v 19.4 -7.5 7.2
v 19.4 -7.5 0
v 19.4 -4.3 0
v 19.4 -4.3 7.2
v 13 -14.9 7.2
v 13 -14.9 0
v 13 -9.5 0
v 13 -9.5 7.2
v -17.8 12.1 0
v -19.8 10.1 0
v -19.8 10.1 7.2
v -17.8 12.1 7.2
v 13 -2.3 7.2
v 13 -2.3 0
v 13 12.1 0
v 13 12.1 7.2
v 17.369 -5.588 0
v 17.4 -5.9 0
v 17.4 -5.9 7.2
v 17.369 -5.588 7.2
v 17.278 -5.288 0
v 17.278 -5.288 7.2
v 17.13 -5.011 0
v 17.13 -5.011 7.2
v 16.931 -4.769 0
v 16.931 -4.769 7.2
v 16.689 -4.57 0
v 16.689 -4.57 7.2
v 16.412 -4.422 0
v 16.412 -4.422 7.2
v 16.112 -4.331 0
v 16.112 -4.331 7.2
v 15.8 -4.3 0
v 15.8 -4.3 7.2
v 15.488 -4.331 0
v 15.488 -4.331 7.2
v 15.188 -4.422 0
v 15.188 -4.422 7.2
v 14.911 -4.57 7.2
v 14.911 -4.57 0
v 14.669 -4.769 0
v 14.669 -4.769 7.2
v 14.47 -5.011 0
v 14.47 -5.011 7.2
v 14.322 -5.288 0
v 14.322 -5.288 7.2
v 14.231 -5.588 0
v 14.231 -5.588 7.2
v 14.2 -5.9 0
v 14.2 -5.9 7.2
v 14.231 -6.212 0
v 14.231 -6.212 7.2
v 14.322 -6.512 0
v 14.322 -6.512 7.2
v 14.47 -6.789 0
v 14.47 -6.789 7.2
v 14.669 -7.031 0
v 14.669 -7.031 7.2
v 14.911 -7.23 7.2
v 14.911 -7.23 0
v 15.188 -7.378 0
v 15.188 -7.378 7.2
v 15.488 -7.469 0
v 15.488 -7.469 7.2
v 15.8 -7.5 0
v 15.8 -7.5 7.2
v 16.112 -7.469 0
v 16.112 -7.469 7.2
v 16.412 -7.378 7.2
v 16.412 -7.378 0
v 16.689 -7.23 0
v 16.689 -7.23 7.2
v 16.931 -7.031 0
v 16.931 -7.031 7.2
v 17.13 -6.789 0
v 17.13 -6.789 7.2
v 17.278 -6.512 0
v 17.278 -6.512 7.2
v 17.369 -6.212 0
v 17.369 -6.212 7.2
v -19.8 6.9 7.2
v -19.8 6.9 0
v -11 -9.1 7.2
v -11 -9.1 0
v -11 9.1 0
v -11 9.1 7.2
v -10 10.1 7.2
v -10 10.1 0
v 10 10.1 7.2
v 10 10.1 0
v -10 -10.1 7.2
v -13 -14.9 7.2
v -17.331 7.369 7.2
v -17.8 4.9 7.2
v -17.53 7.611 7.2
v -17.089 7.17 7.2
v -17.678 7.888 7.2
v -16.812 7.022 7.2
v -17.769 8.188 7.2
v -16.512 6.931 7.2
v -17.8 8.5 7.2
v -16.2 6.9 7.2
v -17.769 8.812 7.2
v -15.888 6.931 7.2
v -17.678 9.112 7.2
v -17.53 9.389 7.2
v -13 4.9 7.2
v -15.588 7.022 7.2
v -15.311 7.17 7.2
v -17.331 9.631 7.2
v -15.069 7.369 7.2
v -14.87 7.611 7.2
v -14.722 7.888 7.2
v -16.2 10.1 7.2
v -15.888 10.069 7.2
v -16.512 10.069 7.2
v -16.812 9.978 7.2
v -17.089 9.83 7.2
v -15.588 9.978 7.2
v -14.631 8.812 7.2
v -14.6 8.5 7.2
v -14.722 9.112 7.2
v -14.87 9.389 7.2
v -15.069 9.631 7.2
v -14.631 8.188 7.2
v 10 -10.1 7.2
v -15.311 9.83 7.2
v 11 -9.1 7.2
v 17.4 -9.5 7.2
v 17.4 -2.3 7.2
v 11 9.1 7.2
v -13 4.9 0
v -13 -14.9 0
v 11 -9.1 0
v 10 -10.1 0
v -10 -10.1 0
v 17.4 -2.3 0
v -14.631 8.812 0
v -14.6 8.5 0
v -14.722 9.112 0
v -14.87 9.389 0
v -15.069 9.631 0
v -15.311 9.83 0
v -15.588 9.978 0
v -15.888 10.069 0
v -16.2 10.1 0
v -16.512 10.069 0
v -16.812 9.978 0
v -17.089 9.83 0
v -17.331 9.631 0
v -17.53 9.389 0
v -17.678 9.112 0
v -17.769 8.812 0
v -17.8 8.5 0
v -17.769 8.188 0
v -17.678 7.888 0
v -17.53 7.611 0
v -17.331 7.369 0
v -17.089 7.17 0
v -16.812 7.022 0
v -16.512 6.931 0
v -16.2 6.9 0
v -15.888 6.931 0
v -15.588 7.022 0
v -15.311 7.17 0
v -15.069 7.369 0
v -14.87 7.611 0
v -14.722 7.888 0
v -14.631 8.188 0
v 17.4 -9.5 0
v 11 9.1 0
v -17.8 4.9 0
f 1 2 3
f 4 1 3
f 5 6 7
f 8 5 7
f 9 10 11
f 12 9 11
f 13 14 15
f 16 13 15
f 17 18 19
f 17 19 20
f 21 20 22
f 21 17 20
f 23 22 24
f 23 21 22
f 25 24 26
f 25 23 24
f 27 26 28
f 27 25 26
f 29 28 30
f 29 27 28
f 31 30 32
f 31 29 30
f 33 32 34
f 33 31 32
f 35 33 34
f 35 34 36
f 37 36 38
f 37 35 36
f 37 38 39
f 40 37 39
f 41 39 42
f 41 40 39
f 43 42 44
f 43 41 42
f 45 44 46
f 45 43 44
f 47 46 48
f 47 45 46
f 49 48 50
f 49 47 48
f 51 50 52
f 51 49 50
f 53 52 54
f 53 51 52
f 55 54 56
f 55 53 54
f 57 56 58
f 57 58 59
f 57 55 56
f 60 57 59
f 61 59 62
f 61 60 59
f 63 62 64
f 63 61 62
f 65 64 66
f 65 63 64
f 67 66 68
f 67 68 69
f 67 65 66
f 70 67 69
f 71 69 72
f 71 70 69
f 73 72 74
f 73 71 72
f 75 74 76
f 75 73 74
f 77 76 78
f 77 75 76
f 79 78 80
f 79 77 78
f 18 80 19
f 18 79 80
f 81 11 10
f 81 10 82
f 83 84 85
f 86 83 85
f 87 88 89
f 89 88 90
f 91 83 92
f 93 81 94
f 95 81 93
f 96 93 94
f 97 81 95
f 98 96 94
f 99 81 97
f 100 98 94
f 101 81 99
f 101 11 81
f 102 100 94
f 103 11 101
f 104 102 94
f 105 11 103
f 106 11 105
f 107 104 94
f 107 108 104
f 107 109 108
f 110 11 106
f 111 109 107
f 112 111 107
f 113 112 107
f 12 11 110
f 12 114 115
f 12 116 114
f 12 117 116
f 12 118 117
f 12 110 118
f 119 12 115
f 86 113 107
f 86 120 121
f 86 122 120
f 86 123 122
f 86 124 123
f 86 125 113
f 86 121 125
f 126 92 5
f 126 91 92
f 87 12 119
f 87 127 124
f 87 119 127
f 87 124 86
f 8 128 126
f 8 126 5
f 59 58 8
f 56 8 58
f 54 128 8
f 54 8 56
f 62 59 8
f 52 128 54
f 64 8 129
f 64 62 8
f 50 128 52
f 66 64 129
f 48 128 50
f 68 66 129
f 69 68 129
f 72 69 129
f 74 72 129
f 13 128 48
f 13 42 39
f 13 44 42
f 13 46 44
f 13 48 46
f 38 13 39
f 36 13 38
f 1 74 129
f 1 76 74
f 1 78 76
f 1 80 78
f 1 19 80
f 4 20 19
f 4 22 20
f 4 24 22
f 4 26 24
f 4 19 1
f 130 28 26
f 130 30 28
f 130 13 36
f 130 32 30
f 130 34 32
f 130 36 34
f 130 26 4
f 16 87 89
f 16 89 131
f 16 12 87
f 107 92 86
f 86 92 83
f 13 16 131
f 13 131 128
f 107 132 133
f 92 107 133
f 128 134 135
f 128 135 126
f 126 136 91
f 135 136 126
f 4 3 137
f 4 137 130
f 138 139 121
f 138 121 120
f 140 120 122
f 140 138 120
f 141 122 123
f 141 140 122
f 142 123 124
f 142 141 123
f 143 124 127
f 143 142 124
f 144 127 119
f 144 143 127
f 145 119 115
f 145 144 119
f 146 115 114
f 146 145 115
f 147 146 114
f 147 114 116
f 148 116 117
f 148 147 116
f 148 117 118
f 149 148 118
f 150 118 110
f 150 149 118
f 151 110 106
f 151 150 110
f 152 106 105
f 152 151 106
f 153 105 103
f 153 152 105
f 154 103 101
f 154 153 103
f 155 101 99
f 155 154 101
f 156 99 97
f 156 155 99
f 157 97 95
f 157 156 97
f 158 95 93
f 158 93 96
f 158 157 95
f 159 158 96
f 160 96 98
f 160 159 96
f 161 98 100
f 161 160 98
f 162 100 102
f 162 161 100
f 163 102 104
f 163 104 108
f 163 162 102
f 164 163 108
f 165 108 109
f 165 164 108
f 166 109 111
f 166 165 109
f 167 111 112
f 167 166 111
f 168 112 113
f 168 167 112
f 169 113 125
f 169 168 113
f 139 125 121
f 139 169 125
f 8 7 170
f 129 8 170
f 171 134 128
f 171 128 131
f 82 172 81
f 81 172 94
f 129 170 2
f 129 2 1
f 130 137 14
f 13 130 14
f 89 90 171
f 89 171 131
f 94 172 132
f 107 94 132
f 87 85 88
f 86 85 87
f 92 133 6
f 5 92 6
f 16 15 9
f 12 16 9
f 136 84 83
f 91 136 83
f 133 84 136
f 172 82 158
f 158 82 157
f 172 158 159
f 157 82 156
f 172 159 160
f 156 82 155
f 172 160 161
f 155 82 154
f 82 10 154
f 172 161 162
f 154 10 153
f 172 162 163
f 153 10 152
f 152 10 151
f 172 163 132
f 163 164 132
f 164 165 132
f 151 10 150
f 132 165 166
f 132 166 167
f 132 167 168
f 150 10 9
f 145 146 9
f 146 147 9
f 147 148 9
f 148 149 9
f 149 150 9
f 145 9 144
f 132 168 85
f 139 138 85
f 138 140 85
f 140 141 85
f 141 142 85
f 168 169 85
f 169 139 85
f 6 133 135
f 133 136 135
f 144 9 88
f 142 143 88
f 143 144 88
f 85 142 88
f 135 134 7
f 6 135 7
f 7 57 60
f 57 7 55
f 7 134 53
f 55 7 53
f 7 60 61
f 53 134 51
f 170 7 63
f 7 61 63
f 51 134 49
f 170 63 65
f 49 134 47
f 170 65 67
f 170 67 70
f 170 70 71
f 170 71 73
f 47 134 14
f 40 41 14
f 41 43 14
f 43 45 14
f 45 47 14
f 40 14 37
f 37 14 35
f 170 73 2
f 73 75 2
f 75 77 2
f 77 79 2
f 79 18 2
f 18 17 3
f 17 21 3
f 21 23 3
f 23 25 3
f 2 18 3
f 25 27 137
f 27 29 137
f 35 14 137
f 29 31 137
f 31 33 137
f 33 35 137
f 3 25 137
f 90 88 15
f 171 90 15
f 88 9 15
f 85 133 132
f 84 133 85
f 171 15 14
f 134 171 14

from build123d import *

# Parameters (mm, degrees)
F0_R     = 1.6
F0_W     = 22
F0_H     = 20.2
F1_DEPTH = 7.2
F2_SIZE  = 2
F3_SIZE  = 1


with BuildPart() as f1:
    # F0 (on Top) → F1 (new body)
    with BuildSketch(Plane.XY):
        Polygon((13, 12.1), (-19.8, 12.1), (-19.8, 4.9), (-13, 4.9), (-13, -14.9), (13, -14.9), (13, -10.1), (13, -9.5), (19.4, -9.5), (19.4, -2.3), (13, -2.3), align=None)
        with Locations((15.8, -5.9)):
            Circle(F0_R, mode=Mode.SUBTRACT)
        with Locations((-16.2, 8.5)):
            Circle(F0_R, mode=Mode.SUBTRACT)
        Rectangle(F0_W, F0_H, mode=Mode.SUBTRACT)
    extrude(amount=F1_DEPTH)

    # F2
    f2_edges = [f1.edges().sort_by_distance(p)[0] for p in [
        (-19.8, 4.9, 3.6),
        (-19.8, 12.1, 3.6),
        (19.4, -9.5, 3.6),
        (19.4, -2.3, 3.6),
    ]]
    chamfer(f2_edges, length=F2_SIZE)

    # F3
    f3_edges = [f1.edges().sort_by_distance(p)[0] for p in [
        (11, 10.1, 3.6),
        (-11, 10.1, 3.6),
        (-11, -10.1, 3.6),
        (11, -10.1, 3.6),
    ]]
    chamfer(f3_edges, length=F3_SIZE)


solid = f1.part
